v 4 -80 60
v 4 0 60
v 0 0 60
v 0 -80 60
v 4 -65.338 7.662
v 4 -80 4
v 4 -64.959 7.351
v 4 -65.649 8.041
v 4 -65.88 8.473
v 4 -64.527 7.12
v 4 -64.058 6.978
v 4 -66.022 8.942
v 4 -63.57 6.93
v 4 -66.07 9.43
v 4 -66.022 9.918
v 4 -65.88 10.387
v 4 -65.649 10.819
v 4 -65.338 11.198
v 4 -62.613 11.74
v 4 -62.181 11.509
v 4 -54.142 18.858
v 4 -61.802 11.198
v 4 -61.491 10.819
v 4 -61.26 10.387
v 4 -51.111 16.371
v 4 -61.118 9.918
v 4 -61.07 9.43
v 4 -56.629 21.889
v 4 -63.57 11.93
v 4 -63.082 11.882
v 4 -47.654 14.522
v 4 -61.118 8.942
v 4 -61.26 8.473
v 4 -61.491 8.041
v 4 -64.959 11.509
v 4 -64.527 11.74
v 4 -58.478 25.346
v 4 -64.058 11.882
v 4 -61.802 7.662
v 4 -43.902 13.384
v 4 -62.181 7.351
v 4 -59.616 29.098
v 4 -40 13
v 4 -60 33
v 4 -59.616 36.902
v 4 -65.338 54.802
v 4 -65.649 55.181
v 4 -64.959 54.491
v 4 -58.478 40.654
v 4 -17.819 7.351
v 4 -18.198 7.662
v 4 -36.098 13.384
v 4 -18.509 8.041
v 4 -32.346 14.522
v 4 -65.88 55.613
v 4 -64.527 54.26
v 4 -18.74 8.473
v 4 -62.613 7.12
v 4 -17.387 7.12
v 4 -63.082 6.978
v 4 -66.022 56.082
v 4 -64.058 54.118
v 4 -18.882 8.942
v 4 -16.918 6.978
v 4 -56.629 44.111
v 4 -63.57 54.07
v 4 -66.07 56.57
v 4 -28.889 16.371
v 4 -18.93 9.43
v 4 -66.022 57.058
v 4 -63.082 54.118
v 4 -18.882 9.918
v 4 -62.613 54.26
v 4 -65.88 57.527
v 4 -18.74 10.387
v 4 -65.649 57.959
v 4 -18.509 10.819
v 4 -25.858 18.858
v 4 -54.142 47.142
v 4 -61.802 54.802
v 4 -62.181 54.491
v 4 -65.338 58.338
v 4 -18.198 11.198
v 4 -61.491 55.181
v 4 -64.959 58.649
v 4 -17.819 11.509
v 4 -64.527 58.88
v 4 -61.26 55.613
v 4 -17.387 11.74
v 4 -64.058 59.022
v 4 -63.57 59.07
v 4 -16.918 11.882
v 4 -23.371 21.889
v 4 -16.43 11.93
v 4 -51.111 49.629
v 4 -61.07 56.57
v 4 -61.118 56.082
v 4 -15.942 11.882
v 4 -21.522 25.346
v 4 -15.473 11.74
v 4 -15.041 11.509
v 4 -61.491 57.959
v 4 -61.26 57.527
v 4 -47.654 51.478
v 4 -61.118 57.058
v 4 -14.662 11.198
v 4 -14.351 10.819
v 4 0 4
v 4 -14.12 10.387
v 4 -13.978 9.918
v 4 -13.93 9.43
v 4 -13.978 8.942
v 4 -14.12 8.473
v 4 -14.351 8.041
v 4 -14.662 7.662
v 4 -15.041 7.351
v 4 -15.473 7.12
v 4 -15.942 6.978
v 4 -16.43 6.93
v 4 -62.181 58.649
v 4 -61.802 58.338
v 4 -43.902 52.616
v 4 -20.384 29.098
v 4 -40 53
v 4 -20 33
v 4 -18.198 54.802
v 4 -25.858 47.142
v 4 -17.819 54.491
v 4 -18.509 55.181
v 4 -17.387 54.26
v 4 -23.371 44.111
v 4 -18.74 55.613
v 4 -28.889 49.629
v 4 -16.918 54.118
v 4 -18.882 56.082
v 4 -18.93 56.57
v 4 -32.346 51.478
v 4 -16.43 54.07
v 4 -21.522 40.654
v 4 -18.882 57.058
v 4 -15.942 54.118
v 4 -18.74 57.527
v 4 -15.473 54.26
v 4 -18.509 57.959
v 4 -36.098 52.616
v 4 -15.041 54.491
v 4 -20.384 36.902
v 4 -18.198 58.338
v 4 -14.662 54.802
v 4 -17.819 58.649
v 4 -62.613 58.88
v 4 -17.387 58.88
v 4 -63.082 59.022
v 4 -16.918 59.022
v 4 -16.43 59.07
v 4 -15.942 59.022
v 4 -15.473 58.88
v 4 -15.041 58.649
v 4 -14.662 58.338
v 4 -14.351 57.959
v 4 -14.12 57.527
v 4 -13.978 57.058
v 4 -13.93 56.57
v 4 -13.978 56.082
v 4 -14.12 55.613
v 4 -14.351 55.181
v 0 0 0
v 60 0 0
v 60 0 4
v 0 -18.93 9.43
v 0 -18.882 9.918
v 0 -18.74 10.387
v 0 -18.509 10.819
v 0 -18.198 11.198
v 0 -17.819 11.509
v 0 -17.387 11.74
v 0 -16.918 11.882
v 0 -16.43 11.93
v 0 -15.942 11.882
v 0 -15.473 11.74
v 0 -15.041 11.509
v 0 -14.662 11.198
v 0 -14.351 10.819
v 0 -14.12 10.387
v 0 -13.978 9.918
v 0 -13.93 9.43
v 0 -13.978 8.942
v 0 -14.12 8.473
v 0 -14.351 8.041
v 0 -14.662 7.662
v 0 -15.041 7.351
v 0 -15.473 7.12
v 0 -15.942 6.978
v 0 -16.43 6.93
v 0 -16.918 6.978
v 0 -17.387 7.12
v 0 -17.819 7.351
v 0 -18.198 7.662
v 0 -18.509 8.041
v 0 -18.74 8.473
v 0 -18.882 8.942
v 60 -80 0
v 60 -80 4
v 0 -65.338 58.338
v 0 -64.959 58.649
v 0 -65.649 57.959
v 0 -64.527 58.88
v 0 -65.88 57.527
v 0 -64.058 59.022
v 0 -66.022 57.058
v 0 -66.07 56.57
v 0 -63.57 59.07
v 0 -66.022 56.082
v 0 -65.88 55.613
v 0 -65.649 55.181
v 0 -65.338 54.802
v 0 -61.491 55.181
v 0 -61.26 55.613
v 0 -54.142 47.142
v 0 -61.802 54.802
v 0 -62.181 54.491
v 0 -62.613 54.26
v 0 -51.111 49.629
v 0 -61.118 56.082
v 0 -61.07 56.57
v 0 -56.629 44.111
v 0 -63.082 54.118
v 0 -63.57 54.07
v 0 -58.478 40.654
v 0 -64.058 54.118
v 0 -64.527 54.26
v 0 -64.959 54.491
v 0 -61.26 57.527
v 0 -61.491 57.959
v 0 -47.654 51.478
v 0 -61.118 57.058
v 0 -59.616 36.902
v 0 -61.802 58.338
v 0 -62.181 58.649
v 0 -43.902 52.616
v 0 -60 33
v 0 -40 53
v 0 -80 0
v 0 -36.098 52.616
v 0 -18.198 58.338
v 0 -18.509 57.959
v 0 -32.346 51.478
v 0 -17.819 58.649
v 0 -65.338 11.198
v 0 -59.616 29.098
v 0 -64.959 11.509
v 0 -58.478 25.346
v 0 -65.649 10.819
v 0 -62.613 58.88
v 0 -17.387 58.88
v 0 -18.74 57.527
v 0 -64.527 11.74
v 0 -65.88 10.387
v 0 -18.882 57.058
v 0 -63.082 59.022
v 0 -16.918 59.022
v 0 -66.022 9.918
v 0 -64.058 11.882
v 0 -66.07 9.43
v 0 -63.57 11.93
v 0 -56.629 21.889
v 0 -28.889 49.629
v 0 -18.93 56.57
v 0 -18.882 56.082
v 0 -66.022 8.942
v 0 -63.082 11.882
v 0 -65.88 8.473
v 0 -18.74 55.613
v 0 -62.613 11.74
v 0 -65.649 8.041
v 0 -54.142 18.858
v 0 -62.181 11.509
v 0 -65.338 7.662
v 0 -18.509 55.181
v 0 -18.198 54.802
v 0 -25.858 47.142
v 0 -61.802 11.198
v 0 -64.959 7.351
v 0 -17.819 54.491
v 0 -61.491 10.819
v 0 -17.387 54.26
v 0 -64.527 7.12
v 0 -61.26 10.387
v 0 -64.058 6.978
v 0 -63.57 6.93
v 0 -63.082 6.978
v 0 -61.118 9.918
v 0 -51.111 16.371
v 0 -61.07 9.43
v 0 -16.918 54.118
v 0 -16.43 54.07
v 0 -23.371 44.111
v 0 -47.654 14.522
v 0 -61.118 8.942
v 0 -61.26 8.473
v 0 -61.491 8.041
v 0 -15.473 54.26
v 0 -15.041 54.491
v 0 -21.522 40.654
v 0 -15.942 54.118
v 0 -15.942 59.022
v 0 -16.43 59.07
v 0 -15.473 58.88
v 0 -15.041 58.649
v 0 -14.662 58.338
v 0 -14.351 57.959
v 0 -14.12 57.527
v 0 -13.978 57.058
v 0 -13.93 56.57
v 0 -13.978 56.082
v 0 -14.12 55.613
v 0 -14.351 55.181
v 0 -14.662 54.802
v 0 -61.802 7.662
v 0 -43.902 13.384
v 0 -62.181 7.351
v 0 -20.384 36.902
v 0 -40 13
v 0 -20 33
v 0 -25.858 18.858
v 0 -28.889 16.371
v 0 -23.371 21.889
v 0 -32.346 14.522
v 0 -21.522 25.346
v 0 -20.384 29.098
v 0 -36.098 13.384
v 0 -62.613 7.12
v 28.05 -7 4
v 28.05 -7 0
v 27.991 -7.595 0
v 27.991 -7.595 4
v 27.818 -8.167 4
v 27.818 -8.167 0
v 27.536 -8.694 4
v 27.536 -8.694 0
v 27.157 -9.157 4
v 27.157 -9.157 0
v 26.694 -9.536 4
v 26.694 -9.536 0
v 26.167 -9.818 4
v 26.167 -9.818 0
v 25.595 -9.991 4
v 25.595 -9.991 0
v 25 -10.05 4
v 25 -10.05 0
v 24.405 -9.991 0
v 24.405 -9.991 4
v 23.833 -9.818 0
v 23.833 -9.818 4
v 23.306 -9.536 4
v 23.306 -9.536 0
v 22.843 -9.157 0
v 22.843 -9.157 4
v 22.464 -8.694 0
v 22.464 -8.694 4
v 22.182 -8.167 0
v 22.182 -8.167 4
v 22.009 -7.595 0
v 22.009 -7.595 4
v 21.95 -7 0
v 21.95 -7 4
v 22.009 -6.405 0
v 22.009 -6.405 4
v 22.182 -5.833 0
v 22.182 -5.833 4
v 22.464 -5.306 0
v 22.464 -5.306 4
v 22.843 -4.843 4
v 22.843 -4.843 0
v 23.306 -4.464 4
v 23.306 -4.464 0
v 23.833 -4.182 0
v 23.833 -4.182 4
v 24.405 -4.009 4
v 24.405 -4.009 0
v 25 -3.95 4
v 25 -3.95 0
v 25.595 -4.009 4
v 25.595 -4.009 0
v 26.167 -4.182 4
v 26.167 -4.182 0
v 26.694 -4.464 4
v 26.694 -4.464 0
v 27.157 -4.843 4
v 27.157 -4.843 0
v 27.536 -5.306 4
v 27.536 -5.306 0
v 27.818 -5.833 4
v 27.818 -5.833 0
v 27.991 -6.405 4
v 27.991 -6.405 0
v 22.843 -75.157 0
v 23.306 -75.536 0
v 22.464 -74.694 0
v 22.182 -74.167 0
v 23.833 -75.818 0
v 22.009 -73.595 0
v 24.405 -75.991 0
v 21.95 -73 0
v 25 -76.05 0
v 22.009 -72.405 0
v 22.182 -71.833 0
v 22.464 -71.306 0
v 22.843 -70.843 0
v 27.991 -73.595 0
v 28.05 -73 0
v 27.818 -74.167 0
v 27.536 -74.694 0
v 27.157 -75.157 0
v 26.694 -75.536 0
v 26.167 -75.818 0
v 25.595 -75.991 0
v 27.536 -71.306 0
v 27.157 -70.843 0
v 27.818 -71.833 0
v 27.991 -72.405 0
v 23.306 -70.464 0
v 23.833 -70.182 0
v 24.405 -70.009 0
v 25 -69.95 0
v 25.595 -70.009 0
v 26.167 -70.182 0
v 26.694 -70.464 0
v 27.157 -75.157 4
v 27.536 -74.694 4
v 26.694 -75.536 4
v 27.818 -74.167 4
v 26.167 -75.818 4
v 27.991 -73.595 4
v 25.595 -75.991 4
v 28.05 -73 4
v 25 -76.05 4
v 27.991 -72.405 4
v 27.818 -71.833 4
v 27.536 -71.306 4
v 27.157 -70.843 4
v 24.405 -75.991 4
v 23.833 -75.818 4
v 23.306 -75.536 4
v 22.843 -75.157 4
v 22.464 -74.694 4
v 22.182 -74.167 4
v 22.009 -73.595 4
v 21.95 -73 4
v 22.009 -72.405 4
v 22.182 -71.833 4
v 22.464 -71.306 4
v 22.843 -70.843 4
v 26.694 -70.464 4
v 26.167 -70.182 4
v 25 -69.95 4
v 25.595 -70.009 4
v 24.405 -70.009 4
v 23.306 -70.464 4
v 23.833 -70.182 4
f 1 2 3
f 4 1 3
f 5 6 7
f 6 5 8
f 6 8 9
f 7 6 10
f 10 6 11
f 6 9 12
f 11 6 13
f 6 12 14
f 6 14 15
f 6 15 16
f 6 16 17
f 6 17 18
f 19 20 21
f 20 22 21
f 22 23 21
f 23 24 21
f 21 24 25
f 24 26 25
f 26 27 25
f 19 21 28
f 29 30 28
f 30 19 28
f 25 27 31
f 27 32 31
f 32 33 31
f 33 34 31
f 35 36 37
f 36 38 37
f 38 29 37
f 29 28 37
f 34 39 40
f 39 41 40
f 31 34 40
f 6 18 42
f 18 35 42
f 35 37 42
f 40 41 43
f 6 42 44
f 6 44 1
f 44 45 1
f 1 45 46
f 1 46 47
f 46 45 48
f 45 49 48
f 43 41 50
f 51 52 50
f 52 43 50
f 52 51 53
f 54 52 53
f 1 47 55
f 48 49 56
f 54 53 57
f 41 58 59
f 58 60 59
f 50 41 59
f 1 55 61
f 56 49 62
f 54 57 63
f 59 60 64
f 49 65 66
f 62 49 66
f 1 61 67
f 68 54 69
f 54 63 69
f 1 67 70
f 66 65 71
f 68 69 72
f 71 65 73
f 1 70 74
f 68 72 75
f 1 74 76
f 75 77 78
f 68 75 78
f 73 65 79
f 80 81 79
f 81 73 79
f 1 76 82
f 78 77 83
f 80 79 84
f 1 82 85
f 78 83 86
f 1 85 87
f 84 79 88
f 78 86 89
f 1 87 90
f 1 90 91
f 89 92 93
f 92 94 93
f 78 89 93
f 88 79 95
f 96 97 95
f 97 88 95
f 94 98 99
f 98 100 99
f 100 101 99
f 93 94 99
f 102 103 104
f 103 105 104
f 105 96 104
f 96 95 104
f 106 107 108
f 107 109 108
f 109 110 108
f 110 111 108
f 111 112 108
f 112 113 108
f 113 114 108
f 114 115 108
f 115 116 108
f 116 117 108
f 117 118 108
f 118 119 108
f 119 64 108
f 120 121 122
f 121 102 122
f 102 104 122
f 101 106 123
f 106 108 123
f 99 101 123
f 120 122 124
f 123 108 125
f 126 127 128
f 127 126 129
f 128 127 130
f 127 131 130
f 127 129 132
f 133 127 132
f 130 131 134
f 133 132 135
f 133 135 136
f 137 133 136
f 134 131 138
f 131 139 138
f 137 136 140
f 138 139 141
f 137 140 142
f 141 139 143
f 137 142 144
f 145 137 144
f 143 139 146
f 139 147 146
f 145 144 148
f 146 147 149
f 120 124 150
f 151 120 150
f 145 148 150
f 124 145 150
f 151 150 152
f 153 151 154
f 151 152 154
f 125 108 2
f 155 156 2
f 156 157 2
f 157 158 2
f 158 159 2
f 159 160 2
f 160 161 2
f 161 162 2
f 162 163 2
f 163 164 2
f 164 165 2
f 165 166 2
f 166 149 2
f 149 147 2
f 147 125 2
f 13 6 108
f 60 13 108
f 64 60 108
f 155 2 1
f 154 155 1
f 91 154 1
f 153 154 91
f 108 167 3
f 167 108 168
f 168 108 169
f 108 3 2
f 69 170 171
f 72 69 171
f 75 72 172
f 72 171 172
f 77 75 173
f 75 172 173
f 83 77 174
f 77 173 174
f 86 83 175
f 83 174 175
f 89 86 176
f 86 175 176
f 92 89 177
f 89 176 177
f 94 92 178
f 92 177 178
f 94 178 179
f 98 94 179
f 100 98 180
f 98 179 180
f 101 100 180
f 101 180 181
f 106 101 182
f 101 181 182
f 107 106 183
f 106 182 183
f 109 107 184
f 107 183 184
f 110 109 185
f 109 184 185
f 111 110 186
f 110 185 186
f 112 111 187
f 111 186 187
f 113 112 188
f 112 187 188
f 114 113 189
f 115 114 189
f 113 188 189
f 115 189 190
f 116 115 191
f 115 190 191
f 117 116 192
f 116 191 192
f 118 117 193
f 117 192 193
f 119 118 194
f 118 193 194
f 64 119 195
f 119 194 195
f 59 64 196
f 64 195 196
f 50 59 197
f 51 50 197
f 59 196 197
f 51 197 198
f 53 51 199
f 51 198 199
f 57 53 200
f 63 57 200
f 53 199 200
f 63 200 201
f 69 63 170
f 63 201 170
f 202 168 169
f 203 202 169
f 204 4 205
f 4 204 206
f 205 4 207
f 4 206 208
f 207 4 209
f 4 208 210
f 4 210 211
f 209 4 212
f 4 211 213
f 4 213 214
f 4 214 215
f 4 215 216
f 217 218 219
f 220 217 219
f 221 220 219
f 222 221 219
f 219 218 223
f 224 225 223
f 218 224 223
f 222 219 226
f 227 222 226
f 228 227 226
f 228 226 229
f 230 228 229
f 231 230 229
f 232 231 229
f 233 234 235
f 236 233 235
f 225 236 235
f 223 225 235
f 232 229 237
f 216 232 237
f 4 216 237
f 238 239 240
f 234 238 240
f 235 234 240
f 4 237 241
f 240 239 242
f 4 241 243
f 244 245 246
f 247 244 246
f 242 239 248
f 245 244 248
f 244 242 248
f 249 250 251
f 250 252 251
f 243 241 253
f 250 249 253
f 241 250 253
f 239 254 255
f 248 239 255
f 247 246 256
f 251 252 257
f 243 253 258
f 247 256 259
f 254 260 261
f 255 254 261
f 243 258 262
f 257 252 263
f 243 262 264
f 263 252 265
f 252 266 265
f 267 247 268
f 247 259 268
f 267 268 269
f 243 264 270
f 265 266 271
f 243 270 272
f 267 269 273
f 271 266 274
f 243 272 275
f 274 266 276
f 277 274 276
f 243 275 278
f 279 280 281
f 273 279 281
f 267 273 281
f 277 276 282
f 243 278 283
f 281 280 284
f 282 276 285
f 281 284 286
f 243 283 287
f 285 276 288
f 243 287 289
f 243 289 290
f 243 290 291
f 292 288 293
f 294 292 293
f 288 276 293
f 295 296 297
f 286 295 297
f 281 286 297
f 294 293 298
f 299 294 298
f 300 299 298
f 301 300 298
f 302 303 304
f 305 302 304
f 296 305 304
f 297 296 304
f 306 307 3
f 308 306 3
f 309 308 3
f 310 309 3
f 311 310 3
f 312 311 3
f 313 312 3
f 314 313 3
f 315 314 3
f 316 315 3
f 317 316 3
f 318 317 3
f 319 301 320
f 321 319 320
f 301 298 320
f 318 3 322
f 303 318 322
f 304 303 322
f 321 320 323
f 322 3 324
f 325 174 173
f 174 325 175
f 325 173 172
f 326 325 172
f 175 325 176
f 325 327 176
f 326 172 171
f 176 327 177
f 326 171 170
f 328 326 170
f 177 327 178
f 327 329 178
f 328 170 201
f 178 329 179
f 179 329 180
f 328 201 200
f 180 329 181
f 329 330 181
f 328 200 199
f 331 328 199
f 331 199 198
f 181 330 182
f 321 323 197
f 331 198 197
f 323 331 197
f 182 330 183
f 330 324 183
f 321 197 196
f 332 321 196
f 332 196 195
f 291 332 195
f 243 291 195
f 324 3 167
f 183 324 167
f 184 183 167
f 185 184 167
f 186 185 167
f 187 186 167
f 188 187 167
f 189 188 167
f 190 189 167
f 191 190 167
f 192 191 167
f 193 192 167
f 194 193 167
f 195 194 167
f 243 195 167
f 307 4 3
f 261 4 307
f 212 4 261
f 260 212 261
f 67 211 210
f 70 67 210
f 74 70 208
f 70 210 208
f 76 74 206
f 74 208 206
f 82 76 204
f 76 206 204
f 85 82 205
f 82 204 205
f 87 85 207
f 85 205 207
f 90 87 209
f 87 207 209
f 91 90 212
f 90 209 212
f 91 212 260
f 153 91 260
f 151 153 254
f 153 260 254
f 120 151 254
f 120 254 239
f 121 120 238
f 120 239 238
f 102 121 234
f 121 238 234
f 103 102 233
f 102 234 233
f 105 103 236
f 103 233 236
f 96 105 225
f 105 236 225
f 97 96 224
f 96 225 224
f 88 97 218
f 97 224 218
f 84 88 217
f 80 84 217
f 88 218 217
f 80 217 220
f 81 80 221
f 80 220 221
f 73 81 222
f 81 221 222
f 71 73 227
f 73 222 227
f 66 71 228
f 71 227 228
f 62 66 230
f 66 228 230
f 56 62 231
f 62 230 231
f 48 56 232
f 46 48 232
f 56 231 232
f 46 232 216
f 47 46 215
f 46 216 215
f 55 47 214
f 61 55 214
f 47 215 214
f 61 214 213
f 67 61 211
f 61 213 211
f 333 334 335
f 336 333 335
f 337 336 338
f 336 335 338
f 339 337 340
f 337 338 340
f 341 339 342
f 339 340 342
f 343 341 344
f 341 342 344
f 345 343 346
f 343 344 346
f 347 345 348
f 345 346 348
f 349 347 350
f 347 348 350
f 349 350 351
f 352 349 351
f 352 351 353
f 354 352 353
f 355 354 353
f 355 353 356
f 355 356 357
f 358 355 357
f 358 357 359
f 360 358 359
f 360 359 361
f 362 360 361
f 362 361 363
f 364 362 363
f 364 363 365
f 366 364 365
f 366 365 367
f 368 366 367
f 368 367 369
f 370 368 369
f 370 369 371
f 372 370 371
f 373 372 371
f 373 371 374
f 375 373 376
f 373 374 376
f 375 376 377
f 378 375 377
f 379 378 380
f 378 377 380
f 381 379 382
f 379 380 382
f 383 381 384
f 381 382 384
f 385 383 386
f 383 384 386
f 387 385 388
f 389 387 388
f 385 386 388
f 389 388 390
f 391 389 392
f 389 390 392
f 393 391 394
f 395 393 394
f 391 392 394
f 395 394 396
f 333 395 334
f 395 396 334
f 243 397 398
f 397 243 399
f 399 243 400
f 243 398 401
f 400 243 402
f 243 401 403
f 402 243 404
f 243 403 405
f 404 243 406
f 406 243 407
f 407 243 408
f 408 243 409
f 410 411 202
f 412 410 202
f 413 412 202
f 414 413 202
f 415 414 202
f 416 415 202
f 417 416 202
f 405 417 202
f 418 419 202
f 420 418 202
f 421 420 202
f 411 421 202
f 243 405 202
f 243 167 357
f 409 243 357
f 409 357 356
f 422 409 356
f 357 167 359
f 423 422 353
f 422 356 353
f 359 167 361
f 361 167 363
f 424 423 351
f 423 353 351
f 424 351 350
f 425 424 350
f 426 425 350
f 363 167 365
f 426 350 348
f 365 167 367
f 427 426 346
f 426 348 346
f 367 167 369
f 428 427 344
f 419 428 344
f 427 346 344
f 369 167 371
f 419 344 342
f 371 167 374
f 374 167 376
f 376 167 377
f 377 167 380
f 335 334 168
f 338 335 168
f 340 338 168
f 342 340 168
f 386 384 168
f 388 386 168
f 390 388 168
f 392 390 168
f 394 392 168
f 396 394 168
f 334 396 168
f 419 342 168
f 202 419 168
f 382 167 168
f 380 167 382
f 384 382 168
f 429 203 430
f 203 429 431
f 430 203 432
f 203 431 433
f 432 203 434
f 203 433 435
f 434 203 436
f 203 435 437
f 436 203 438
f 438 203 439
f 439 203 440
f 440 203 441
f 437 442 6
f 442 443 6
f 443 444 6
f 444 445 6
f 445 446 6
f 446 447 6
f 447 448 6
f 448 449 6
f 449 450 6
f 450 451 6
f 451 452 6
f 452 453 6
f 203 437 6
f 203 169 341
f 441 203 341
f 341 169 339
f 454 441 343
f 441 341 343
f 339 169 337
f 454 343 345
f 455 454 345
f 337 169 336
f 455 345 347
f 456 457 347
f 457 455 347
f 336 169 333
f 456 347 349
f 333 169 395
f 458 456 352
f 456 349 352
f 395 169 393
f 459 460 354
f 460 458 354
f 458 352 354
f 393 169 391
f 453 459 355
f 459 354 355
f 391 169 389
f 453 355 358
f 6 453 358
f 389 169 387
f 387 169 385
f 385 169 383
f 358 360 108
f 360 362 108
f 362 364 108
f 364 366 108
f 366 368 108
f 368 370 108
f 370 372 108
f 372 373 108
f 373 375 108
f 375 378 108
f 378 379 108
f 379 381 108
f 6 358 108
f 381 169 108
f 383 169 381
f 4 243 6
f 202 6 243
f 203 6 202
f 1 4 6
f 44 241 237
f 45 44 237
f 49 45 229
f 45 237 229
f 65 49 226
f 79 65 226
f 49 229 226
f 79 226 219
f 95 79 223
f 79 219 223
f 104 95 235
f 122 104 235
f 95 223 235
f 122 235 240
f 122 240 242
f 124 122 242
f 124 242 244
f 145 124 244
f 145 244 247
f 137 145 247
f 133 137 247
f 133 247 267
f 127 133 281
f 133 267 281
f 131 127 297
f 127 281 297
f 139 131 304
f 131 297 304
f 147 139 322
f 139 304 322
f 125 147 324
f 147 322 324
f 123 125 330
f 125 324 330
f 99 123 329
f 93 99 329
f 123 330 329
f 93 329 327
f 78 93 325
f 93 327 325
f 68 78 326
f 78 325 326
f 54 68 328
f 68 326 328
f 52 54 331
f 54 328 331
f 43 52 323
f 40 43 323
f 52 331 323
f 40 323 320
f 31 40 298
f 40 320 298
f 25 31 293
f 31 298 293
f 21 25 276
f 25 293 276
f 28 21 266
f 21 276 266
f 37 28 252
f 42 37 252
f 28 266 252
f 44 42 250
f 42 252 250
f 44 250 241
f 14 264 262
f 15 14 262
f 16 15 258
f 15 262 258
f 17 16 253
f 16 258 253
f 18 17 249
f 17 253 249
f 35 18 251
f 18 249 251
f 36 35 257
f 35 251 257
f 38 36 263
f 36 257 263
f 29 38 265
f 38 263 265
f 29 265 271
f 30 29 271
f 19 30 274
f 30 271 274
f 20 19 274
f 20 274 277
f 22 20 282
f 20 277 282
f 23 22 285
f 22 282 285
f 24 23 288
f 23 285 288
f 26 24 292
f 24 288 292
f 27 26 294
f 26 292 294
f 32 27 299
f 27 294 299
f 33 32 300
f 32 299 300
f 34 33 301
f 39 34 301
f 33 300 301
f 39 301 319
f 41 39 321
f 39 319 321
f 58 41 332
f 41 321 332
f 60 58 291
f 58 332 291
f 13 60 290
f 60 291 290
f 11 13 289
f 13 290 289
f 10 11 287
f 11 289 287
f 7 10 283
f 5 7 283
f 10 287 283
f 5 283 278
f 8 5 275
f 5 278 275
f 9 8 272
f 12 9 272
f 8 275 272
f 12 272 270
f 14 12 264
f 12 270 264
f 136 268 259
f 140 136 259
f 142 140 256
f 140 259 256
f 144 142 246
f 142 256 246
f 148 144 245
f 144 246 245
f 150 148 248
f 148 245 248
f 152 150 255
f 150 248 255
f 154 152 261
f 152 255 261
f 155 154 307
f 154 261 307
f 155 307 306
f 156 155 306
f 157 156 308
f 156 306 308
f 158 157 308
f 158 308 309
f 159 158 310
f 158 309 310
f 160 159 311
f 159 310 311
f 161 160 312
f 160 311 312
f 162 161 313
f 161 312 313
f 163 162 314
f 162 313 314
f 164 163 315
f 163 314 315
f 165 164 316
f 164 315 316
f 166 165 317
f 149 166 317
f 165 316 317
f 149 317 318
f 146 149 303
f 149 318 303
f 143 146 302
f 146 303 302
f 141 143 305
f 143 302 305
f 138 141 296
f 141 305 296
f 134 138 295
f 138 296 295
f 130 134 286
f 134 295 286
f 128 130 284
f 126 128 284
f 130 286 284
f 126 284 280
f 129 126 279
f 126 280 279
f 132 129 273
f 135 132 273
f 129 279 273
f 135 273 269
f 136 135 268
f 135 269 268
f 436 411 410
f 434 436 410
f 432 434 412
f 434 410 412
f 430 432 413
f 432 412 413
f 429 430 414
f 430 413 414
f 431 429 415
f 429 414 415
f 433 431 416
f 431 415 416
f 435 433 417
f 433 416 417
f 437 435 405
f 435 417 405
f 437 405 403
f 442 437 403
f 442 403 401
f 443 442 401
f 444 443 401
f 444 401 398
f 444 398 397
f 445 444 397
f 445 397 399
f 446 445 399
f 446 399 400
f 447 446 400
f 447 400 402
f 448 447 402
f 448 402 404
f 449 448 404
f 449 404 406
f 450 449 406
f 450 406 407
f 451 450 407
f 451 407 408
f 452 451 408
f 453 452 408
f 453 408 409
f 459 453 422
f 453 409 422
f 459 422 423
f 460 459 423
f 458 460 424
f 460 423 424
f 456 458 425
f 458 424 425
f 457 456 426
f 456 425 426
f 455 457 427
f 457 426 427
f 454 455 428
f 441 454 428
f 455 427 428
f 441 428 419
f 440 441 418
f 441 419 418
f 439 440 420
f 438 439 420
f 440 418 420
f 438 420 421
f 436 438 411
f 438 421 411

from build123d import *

# Parameters (mm, degrees)
F1_DEPTH = 80
F3_R     = 3.05
F4_DEPTH = 25
F2_R     = 2.5
F2_R_2   = 20
F5_DEPTH = 4


with BuildPart() as f1:
    # F0 (on Front) → F1 (new body)
    with BuildSketch(Plane.XZ):
        Polygon((0, 60), (0, 0), (60, 0), (60, 4), (4, 4), (4, 60), align=None)
    extrude(amount=F1_DEPTH)

    # F3 (on face) → F4 (cut)
    with BuildSketch(Plane(origin=(0, 0, 0), x_dir=(1, 0, 0), z_dir=(0, 0, -1))):
        with Locations((25, 73)):
            Circle(F3_R)
        with Locations((25, 7)):
            Circle(F3_R)
    extrude(amount=-F4_DEPTH, mode=Mode.SUBTRACT)

    # F2 (on face) → F5 (cut, through all)
    with BuildSketch(Plane(origin=(0, 0, 0), x_dir=(0, -1, 0), z_dir=(-1, 0, 0))):
        with Locations((16.43, 56.57)):
            Circle(F2_R)
        with Locations((40, 33)):
            Circle(F2_R_2)
        with Locations((63.57, 56.57)):
            Circle(F2_R)
        with Locations((16.43, 9.43)):
            Circle(F2_R)
        with Locations((63.57, 9.43)):
            Circle(F2_R)
    extrude(amount=-F5_DEPTH, mode=Mode.SUBTRACT)


solid = f1.part
